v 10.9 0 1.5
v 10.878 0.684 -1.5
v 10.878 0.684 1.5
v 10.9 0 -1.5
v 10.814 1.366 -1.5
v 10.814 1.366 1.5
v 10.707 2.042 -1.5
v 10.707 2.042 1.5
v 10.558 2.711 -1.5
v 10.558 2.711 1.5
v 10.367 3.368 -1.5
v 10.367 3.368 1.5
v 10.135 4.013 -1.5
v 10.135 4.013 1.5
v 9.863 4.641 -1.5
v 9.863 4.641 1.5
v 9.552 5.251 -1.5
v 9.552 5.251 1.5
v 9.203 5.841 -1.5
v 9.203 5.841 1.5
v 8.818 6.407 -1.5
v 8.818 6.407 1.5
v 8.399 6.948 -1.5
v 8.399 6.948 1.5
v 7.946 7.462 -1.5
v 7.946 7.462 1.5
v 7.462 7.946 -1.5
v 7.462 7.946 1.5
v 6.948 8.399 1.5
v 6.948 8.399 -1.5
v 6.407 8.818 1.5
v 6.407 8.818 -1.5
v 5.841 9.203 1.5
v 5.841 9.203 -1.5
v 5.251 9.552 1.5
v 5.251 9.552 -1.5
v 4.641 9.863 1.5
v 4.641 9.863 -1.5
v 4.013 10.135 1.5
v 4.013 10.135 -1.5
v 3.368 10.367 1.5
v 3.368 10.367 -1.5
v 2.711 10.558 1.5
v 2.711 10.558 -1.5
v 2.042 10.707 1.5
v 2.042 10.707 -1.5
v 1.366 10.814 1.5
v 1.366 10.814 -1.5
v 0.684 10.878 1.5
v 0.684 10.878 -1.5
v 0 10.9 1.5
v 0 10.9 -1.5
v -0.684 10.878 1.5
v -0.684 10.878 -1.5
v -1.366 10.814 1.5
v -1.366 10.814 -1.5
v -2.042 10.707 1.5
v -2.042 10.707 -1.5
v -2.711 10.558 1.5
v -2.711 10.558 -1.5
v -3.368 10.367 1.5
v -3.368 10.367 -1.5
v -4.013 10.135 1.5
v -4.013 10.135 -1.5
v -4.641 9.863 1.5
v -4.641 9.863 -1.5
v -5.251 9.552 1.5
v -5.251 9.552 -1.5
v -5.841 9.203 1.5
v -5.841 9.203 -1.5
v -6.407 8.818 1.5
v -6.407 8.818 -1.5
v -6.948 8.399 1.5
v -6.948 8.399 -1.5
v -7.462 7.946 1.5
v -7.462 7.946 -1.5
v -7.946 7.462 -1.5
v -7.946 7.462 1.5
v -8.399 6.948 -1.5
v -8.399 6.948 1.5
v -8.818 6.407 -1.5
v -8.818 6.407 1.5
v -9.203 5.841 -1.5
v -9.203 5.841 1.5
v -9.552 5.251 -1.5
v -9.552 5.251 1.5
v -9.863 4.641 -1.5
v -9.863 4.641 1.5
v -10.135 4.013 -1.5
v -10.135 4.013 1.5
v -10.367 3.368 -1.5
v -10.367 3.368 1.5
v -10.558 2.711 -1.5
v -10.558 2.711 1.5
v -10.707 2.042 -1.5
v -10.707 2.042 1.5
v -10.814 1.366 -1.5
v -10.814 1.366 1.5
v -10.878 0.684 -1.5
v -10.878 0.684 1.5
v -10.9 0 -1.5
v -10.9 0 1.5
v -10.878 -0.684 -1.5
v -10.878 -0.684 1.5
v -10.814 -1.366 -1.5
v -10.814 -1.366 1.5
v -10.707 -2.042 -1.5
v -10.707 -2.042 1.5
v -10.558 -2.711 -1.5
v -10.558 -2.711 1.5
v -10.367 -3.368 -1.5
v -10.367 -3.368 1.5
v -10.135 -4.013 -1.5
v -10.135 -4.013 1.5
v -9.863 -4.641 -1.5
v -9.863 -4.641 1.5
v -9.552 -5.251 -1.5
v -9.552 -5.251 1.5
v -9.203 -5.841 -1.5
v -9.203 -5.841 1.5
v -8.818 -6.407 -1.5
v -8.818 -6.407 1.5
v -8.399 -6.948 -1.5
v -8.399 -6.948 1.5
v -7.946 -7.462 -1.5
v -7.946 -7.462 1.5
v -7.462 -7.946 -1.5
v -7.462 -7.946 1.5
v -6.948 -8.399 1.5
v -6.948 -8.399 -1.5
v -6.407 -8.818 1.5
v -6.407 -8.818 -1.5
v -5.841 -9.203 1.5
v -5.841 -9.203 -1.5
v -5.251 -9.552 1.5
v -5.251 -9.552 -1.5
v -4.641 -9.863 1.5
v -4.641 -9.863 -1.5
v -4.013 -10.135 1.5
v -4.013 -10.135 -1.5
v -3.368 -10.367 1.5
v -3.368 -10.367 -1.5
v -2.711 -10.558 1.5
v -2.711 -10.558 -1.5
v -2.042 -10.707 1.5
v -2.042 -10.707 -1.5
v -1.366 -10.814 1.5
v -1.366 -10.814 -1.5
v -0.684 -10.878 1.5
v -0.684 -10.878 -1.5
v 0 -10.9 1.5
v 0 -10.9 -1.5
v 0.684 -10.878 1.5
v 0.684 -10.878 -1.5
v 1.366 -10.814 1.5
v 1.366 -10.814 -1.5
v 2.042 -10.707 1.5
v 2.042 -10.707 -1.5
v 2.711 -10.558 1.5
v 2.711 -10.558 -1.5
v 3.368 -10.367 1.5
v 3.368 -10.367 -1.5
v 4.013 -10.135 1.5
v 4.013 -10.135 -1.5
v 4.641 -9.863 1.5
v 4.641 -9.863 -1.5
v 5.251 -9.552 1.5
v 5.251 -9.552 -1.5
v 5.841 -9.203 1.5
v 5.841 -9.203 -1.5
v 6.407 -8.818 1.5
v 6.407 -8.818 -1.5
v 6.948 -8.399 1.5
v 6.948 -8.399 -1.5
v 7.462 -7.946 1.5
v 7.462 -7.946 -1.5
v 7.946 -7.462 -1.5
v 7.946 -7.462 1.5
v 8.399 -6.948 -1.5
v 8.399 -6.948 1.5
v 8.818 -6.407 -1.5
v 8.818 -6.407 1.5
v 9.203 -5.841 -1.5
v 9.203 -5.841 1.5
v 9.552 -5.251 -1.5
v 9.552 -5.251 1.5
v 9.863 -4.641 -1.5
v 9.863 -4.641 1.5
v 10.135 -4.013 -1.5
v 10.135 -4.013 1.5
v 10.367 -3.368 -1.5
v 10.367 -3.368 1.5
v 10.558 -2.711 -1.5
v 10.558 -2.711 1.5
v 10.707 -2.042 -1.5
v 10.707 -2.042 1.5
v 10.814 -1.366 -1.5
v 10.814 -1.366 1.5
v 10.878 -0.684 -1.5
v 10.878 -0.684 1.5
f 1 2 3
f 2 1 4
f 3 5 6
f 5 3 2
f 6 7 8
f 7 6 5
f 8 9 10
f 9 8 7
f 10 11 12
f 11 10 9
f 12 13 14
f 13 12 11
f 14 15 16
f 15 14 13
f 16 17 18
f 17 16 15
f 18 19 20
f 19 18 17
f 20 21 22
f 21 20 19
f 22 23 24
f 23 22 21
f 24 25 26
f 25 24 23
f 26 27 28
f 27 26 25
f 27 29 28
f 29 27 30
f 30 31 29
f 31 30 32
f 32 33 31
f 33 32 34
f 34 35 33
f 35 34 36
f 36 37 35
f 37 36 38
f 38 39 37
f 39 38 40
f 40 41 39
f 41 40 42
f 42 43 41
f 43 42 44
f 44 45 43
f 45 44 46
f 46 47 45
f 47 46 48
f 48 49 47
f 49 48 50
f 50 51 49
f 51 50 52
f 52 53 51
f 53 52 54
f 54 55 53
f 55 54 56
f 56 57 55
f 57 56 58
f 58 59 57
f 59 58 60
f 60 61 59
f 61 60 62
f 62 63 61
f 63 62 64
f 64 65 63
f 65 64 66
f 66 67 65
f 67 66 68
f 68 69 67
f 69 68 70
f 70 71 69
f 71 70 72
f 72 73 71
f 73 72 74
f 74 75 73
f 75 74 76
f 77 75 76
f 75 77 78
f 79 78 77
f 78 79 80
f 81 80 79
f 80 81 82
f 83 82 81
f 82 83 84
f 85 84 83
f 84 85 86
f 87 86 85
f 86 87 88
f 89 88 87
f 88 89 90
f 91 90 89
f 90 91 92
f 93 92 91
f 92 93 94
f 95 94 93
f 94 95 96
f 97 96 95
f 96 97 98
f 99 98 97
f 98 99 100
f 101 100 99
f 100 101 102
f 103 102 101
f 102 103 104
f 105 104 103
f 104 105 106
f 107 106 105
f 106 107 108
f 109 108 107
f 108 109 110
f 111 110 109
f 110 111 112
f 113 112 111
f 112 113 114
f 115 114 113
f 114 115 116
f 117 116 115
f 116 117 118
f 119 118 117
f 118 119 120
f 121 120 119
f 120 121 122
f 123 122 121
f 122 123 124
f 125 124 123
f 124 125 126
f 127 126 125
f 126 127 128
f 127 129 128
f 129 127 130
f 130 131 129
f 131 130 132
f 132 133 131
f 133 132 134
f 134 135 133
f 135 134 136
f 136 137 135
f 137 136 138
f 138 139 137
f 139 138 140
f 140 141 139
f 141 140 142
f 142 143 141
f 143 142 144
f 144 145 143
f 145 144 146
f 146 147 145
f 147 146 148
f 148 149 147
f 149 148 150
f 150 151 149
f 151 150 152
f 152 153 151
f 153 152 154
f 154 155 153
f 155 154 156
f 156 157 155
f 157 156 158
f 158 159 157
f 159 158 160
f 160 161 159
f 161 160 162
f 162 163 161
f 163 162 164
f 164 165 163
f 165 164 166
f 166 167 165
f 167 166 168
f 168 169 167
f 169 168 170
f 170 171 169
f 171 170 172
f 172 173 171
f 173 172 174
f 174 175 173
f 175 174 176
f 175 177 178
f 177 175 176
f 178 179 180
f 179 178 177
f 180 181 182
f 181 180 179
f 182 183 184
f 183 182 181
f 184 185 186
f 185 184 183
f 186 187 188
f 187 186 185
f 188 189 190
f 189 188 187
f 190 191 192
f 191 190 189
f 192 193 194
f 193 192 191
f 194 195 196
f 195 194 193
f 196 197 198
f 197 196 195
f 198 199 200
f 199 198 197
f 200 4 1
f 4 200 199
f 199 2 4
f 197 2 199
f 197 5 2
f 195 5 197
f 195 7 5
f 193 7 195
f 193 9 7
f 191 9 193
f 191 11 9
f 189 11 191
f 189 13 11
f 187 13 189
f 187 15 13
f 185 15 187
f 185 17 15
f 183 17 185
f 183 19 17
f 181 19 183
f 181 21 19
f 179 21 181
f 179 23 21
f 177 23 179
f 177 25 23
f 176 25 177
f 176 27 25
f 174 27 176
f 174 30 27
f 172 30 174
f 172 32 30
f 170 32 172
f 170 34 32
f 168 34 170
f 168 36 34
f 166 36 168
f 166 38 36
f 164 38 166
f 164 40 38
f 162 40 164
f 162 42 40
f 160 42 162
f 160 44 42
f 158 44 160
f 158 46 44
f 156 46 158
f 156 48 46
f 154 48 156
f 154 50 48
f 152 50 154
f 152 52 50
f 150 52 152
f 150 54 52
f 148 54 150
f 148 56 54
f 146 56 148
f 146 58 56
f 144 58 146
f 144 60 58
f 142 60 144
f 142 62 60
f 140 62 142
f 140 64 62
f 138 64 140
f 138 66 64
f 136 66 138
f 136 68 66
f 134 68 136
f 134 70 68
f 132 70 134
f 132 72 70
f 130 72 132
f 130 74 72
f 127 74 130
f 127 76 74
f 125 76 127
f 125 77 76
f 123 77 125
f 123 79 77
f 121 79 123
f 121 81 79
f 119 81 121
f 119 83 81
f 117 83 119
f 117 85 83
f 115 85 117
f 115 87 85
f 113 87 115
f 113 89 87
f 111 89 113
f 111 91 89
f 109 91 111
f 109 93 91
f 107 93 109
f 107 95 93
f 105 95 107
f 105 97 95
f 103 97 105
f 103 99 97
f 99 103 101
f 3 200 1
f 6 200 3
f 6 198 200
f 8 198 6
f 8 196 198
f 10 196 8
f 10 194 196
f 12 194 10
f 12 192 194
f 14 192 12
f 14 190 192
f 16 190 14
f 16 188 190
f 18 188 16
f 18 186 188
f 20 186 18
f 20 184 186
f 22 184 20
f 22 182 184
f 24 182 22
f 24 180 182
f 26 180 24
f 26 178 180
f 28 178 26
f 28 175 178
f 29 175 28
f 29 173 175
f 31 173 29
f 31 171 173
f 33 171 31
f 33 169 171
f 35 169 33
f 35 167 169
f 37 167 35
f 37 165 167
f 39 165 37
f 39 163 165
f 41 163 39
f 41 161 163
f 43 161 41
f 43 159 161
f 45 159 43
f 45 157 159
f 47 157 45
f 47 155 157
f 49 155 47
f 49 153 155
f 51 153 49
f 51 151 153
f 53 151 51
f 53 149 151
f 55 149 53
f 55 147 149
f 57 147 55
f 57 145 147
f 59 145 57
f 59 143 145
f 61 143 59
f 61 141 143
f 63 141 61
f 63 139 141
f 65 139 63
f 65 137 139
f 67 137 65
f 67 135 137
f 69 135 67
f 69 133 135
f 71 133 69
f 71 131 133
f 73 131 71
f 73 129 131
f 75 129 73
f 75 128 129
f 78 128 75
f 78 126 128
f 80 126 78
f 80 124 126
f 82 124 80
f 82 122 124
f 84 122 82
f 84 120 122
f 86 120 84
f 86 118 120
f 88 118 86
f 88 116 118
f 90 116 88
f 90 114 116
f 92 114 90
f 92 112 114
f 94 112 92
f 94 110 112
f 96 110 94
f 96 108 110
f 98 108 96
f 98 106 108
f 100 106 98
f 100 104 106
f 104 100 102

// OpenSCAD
disk();

module disk(height = 3)
{
    cylinder (h = height, r=10.9, center = true, $fn=100);    
}
